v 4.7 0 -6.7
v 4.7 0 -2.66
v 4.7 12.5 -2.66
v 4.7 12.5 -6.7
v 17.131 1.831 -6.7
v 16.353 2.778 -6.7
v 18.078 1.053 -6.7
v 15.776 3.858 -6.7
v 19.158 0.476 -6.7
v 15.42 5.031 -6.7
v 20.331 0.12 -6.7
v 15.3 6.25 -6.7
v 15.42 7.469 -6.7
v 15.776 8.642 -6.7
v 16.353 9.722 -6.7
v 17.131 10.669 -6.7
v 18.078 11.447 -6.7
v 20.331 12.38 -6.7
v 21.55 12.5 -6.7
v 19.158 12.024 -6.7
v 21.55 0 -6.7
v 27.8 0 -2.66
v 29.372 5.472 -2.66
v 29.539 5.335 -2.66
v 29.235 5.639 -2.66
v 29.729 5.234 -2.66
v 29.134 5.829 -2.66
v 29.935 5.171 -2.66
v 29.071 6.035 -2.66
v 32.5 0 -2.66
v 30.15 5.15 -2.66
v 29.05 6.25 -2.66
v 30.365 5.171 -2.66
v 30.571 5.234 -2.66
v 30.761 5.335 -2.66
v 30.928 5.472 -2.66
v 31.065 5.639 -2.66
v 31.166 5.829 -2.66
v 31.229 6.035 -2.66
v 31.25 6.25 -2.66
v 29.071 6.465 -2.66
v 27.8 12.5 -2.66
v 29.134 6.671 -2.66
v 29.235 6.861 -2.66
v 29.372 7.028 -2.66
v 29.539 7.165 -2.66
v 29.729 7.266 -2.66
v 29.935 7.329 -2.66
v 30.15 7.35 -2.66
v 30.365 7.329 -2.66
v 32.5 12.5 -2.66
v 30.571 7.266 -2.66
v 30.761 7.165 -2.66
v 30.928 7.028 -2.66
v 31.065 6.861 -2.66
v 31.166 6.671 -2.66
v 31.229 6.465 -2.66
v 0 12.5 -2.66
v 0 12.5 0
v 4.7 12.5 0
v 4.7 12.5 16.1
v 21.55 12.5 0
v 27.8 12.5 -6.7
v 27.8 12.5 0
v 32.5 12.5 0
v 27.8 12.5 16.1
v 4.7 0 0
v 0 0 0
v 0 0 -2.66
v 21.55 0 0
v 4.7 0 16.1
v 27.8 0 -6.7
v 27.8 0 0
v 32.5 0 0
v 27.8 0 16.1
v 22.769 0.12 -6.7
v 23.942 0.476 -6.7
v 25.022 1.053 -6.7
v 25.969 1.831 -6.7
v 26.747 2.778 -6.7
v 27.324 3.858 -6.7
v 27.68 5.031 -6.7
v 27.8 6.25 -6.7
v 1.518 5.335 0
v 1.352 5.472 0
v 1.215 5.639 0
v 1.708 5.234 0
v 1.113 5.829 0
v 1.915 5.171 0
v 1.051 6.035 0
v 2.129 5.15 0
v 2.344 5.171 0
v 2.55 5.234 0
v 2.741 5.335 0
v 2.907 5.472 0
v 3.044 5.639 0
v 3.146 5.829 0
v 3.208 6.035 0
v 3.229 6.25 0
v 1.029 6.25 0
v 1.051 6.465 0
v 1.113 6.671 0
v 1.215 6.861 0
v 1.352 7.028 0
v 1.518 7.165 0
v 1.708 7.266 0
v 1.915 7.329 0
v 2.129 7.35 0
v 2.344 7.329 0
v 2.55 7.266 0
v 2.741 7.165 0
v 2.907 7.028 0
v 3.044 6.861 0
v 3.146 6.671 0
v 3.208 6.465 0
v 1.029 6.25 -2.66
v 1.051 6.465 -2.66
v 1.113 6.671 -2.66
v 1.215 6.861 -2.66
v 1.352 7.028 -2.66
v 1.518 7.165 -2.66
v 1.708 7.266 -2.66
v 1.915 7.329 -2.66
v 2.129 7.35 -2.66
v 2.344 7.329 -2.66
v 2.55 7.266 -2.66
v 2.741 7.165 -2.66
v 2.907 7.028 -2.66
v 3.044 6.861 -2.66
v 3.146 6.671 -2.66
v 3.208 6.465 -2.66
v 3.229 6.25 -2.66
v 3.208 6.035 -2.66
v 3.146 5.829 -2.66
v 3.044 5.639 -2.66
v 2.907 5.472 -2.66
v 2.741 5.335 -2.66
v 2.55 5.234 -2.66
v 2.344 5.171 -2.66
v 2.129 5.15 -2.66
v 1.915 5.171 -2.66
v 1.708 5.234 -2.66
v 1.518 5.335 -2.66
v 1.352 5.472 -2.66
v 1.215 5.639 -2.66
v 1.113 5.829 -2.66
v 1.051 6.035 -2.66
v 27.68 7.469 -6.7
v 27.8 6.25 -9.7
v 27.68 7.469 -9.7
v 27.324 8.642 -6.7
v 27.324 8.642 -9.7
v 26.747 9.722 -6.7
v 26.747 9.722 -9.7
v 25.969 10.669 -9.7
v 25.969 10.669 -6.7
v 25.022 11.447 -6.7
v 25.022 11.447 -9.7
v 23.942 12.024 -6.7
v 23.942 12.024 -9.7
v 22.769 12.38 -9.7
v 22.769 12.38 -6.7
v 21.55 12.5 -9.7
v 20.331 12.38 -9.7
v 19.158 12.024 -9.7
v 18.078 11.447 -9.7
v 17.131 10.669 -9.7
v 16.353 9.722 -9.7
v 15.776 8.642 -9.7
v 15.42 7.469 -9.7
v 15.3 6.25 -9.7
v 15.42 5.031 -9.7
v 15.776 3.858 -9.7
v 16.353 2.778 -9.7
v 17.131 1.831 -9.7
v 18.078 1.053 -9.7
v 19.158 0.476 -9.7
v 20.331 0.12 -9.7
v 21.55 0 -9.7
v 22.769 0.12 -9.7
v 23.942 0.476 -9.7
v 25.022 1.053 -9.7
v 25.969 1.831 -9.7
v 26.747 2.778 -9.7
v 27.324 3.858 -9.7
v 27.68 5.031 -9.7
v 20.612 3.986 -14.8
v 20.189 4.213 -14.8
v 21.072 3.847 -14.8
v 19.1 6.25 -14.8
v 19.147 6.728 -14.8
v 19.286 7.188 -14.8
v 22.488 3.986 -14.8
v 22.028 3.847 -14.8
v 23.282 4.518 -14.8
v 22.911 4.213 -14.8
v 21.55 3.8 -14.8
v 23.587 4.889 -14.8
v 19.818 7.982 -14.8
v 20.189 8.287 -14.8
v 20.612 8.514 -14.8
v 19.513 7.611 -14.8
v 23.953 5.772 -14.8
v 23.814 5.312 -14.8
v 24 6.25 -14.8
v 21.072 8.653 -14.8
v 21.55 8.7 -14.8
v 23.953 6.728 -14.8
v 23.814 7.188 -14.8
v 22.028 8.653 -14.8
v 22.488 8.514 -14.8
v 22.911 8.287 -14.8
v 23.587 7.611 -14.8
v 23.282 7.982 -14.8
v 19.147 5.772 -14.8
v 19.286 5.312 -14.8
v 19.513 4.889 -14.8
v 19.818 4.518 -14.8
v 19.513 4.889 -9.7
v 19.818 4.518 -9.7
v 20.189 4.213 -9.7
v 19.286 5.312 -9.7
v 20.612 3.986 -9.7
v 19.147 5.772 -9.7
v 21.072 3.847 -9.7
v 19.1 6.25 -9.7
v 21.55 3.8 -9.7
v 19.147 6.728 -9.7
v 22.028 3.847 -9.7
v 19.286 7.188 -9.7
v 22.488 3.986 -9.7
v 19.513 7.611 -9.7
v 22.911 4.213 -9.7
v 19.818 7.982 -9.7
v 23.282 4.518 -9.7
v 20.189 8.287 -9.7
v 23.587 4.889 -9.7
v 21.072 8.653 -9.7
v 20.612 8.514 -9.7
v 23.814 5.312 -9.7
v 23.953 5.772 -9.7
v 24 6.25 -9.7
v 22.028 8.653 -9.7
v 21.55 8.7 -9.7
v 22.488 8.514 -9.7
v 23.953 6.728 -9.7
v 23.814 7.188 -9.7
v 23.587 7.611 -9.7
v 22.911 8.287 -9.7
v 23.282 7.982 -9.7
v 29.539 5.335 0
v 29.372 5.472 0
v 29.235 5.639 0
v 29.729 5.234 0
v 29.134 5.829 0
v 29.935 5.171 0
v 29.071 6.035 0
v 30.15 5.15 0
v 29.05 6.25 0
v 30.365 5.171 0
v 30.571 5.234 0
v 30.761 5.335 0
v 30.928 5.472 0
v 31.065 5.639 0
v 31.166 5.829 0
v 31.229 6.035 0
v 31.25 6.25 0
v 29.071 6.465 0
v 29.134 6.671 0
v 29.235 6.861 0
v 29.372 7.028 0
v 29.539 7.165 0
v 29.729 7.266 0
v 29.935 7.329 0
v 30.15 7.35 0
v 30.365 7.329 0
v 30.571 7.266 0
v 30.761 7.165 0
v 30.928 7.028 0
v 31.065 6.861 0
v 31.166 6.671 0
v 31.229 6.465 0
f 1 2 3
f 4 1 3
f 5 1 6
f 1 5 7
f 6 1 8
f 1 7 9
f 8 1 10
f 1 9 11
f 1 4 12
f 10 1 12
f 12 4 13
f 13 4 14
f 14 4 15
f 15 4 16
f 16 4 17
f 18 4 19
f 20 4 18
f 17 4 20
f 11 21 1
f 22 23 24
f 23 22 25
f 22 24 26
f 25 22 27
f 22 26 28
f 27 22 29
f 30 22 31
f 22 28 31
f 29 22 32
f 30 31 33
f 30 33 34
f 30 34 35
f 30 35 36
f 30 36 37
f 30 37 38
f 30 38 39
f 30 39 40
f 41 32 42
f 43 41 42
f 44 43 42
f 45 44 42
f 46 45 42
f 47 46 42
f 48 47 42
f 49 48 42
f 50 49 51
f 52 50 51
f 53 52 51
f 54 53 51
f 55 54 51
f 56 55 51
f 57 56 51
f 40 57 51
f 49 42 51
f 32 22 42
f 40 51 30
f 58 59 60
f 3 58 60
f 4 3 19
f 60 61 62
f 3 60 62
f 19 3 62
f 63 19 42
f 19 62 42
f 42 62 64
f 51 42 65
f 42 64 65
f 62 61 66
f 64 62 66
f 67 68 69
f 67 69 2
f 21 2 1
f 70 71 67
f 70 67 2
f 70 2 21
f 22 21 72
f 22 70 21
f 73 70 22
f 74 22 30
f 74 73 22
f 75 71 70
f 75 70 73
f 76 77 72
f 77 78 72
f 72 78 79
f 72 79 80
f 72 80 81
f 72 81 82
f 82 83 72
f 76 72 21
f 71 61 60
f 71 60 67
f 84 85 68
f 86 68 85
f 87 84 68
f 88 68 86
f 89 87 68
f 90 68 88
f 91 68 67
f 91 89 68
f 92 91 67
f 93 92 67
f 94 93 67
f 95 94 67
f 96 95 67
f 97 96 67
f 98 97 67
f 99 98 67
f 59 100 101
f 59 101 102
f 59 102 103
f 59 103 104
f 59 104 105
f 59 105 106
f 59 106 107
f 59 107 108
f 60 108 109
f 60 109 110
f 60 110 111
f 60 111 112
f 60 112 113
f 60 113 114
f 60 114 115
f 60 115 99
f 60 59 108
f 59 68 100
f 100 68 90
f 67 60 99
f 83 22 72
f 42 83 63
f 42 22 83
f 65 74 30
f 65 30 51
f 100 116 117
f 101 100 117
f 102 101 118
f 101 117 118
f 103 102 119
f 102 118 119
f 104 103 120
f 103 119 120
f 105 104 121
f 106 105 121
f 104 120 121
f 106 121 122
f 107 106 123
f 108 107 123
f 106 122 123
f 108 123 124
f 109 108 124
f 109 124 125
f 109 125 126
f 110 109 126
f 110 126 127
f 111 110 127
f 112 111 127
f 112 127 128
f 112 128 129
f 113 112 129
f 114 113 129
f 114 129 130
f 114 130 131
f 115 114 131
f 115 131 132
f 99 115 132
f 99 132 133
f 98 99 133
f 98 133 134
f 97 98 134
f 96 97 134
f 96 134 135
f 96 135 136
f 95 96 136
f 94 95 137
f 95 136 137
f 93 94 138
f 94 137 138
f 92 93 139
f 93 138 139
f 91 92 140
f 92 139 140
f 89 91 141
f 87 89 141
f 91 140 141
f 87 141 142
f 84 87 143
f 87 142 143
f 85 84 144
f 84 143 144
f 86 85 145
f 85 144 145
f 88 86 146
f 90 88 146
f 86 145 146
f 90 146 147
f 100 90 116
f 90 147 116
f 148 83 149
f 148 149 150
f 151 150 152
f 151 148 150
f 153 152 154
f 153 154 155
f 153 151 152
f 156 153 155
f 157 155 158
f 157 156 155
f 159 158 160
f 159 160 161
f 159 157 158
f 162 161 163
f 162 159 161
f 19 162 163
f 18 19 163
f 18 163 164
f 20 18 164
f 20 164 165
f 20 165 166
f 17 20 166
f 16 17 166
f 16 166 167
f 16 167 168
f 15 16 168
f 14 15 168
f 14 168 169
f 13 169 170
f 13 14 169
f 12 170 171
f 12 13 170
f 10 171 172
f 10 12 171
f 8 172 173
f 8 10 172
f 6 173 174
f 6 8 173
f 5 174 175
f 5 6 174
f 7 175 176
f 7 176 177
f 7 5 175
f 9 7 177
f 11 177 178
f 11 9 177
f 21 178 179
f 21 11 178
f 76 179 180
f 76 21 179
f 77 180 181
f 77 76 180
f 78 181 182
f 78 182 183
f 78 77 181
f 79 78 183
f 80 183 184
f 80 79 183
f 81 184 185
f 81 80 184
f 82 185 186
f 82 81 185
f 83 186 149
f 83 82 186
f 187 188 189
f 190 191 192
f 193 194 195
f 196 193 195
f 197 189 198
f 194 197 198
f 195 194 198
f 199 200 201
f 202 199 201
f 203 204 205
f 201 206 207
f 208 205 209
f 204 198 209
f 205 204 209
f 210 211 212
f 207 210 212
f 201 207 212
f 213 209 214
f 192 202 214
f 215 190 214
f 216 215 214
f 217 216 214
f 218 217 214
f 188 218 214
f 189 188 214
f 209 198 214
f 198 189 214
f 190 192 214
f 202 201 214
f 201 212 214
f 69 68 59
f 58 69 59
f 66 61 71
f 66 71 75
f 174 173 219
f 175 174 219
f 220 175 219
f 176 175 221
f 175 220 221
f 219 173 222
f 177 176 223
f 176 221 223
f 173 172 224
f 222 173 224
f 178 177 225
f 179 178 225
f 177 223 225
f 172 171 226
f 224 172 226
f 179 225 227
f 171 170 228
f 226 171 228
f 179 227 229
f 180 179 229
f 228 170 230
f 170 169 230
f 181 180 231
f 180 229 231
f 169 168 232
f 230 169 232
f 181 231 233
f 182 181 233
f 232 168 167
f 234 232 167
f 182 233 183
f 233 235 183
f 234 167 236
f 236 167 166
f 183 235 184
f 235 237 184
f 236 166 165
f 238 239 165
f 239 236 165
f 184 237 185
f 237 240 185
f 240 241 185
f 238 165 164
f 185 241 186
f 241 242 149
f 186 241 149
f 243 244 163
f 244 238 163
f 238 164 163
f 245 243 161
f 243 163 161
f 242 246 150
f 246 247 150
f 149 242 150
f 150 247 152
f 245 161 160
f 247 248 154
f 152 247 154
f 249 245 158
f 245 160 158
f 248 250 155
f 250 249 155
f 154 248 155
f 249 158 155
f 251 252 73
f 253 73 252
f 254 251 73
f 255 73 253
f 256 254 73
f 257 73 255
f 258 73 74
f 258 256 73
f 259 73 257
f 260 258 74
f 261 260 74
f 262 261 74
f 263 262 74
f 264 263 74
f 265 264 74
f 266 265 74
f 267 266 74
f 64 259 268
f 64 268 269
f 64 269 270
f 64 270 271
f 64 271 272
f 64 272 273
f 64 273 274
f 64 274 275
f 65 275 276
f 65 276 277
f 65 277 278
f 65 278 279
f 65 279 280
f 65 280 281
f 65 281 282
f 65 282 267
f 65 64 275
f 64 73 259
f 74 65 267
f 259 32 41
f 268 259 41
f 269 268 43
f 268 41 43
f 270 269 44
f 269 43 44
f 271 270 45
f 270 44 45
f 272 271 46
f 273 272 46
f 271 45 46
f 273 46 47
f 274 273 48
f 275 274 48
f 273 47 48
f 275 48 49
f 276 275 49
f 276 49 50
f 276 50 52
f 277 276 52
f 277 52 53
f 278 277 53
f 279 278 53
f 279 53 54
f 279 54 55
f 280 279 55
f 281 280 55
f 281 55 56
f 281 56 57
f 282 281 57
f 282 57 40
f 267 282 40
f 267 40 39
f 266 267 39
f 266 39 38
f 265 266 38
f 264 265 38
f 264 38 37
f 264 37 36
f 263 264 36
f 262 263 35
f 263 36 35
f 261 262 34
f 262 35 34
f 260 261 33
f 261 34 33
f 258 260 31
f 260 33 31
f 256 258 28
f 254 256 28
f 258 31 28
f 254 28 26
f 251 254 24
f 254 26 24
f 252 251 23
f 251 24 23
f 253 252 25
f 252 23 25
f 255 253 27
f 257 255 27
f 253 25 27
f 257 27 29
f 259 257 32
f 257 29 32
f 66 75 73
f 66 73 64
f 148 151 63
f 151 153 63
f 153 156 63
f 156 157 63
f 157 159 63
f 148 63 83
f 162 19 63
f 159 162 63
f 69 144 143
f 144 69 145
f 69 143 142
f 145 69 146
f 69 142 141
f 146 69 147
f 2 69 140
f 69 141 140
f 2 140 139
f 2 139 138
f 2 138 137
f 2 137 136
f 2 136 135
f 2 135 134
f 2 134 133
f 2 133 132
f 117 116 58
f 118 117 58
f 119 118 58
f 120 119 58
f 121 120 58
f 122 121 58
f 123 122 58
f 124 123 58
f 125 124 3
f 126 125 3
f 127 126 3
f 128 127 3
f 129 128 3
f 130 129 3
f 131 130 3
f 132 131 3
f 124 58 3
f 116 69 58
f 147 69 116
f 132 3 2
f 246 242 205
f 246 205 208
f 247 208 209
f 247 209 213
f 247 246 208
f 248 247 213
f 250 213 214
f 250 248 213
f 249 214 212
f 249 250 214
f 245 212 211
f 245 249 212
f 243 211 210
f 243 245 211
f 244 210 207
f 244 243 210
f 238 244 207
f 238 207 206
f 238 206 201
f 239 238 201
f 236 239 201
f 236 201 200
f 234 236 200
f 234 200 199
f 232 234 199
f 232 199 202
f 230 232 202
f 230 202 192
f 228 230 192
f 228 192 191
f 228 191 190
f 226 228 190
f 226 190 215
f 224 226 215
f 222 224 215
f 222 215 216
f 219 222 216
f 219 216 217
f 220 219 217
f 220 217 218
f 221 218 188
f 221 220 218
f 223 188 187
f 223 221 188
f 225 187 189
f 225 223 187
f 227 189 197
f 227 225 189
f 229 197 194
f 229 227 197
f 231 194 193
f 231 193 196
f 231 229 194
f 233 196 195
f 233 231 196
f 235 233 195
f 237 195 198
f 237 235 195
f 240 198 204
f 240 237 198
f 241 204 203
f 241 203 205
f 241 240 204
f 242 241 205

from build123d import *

# Parameters (mm, degrees)
SKETCH_1_R          = 6.25
SKETCH_1_R_2        = 2.45
EXTRUDE_1_DEPTH     = 16.1
SKETCH_1_3_W        = 32.5
SKETCH_1_3_H        = 12.5
EXTRUDE_2_DEPTH     = 2.66
SKETCH_1_4_R        = 6.25
SKETCH_1_4_R_2      = 2.45
SKETCH_1_4_W        = 23.1
SKETCH_1_4_H        = 12.5
EXTRUDE_3_DEPTH     = 6.7
SKETCH_1_5_R        = 6.25
EXTRUDE_4_DEPTH     = 9.7
SKETCH_1_6_R        = 2.45
EXTRUDE_5_DEPTH     = 14.8
SKETCH_3_R          = 1.1
CUT_EXTRUDE_1_DEPTH = 14.8
SKETCH_2_R          = 1.1
CUT_EXTRUDE_2_DEPTH = 14.8


with BuildPart() as part:
    # 草图1 → 凸台-拉伸1 (new body)
    with BuildSketch(Plane.XY):
        with BuildLine():
            Line((4.7, 12.5), (4.7, 0))
            Line((4.7, 0), (21.55, 0))
            ThreePointArc((21.55, 0), (15.3, 6.25), (21.55, 12.5))
            Line((21.55, 12.5), (4.7, 12.5))
        make_face()
        with BuildLine():
            Line((27.8, 12.5), (21.55, 12.5))
            ThreePointArc((21.55, 12.5), (25.969417382, 10.669417382), (27.8, 6.25))
            Line((27.8, 6.25), (27.8, 12.5))
        make_face()
        with BuildLine():
            ThreePointArc((27.8, 6.25), (25.969417382, 1.830582618), (21.55, 0))
            Line((21.55, 0), (27.8, 0))
            Line((27.8, 0), (27.8, 6.25))
        make_face()
        with Locations((21.55, 6.25)):
            Circle(SKETCH_1_R)
        with Locations((21.55, 6.25)):
            Circle(SKETCH_1_R_2, mode=Mode.SUBTRACT)
        with Locations((21.55, 6.25)):
            Circle(SKETCH_1_R_2)
    extrude(amount=EXTRUDE_1_DEPTH)

    # 草图1<3> → 凸台-拉伸2 (add)
    with BuildSketch(Plane.XY):
        with Locations((16.25, 6.25)):
            Rectangle(SKETCH_1_3_W, SKETCH_1_3_H)
    extrude(amount=-EXTRUDE_2_DEPTH)

    # 草图1<4> → 凸台-拉伸3 (add)
    with BuildSketch(Plane.XY):
        with Locations((21.55, 6.25)):
            Circle(SKETCH_1_4_R)
        with Locations((21.55, 6.25)):
            Circle(SKETCH_1_4_R_2, mode=Mode.SUBTRACT)
        with Locations((16.25, 6.25)):
            Rectangle(SKETCH_1_4_W, SKETCH_1_4_H)
    extrude(amount=-EXTRUDE_3_DEPTH)

    # 草图1<5> → 凸台-拉伸4 (add)
    with BuildSketch(Plane.XY):
        with Locations((21.55, 6.25)):
            Circle(SKETCH_1_5_R)
    extrude(amount=-EXTRUDE_4_DEPTH)

    # 草图1<6> → 凸台-拉伸5 (add)
    with BuildSketch(Plane.XY):
        with Locations((21.55, 6.25)):
            Circle(SKETCH_1_6_R)
    extrude(amount=-EXTRUDE_5_DEPTH)

    # 草图3 → 切除-拉伸1 (cut)
    with BuildSketch(Plane(origin=(0, 0, -2.66), x_dir=(-1, 0, 0), z_dir=(0, 0, -1))):
        with Locations((-2.12941164, 6.25)):
            Circle(SKETCH_3_R)
    extrude(amount=-CUT_EXTRUDE_1_DEPTH, mode=Mode.SUBTRACT)

    # 草图2 → 切除-拉伸2 (cut)
    with BuildSketch(Plane(origin=(0, 0, -2.66), x_dir=(-1, 0, 0), z_dir=(0, 0, -1))):
        with Locations((-30.15, 6.25)):
            Circle(SKETCH_2_R)
    extrude(amount=-CUT_EXTRUDE_2_DEPTH, mode=Mode.SUBTRACT)


solid = part.part
